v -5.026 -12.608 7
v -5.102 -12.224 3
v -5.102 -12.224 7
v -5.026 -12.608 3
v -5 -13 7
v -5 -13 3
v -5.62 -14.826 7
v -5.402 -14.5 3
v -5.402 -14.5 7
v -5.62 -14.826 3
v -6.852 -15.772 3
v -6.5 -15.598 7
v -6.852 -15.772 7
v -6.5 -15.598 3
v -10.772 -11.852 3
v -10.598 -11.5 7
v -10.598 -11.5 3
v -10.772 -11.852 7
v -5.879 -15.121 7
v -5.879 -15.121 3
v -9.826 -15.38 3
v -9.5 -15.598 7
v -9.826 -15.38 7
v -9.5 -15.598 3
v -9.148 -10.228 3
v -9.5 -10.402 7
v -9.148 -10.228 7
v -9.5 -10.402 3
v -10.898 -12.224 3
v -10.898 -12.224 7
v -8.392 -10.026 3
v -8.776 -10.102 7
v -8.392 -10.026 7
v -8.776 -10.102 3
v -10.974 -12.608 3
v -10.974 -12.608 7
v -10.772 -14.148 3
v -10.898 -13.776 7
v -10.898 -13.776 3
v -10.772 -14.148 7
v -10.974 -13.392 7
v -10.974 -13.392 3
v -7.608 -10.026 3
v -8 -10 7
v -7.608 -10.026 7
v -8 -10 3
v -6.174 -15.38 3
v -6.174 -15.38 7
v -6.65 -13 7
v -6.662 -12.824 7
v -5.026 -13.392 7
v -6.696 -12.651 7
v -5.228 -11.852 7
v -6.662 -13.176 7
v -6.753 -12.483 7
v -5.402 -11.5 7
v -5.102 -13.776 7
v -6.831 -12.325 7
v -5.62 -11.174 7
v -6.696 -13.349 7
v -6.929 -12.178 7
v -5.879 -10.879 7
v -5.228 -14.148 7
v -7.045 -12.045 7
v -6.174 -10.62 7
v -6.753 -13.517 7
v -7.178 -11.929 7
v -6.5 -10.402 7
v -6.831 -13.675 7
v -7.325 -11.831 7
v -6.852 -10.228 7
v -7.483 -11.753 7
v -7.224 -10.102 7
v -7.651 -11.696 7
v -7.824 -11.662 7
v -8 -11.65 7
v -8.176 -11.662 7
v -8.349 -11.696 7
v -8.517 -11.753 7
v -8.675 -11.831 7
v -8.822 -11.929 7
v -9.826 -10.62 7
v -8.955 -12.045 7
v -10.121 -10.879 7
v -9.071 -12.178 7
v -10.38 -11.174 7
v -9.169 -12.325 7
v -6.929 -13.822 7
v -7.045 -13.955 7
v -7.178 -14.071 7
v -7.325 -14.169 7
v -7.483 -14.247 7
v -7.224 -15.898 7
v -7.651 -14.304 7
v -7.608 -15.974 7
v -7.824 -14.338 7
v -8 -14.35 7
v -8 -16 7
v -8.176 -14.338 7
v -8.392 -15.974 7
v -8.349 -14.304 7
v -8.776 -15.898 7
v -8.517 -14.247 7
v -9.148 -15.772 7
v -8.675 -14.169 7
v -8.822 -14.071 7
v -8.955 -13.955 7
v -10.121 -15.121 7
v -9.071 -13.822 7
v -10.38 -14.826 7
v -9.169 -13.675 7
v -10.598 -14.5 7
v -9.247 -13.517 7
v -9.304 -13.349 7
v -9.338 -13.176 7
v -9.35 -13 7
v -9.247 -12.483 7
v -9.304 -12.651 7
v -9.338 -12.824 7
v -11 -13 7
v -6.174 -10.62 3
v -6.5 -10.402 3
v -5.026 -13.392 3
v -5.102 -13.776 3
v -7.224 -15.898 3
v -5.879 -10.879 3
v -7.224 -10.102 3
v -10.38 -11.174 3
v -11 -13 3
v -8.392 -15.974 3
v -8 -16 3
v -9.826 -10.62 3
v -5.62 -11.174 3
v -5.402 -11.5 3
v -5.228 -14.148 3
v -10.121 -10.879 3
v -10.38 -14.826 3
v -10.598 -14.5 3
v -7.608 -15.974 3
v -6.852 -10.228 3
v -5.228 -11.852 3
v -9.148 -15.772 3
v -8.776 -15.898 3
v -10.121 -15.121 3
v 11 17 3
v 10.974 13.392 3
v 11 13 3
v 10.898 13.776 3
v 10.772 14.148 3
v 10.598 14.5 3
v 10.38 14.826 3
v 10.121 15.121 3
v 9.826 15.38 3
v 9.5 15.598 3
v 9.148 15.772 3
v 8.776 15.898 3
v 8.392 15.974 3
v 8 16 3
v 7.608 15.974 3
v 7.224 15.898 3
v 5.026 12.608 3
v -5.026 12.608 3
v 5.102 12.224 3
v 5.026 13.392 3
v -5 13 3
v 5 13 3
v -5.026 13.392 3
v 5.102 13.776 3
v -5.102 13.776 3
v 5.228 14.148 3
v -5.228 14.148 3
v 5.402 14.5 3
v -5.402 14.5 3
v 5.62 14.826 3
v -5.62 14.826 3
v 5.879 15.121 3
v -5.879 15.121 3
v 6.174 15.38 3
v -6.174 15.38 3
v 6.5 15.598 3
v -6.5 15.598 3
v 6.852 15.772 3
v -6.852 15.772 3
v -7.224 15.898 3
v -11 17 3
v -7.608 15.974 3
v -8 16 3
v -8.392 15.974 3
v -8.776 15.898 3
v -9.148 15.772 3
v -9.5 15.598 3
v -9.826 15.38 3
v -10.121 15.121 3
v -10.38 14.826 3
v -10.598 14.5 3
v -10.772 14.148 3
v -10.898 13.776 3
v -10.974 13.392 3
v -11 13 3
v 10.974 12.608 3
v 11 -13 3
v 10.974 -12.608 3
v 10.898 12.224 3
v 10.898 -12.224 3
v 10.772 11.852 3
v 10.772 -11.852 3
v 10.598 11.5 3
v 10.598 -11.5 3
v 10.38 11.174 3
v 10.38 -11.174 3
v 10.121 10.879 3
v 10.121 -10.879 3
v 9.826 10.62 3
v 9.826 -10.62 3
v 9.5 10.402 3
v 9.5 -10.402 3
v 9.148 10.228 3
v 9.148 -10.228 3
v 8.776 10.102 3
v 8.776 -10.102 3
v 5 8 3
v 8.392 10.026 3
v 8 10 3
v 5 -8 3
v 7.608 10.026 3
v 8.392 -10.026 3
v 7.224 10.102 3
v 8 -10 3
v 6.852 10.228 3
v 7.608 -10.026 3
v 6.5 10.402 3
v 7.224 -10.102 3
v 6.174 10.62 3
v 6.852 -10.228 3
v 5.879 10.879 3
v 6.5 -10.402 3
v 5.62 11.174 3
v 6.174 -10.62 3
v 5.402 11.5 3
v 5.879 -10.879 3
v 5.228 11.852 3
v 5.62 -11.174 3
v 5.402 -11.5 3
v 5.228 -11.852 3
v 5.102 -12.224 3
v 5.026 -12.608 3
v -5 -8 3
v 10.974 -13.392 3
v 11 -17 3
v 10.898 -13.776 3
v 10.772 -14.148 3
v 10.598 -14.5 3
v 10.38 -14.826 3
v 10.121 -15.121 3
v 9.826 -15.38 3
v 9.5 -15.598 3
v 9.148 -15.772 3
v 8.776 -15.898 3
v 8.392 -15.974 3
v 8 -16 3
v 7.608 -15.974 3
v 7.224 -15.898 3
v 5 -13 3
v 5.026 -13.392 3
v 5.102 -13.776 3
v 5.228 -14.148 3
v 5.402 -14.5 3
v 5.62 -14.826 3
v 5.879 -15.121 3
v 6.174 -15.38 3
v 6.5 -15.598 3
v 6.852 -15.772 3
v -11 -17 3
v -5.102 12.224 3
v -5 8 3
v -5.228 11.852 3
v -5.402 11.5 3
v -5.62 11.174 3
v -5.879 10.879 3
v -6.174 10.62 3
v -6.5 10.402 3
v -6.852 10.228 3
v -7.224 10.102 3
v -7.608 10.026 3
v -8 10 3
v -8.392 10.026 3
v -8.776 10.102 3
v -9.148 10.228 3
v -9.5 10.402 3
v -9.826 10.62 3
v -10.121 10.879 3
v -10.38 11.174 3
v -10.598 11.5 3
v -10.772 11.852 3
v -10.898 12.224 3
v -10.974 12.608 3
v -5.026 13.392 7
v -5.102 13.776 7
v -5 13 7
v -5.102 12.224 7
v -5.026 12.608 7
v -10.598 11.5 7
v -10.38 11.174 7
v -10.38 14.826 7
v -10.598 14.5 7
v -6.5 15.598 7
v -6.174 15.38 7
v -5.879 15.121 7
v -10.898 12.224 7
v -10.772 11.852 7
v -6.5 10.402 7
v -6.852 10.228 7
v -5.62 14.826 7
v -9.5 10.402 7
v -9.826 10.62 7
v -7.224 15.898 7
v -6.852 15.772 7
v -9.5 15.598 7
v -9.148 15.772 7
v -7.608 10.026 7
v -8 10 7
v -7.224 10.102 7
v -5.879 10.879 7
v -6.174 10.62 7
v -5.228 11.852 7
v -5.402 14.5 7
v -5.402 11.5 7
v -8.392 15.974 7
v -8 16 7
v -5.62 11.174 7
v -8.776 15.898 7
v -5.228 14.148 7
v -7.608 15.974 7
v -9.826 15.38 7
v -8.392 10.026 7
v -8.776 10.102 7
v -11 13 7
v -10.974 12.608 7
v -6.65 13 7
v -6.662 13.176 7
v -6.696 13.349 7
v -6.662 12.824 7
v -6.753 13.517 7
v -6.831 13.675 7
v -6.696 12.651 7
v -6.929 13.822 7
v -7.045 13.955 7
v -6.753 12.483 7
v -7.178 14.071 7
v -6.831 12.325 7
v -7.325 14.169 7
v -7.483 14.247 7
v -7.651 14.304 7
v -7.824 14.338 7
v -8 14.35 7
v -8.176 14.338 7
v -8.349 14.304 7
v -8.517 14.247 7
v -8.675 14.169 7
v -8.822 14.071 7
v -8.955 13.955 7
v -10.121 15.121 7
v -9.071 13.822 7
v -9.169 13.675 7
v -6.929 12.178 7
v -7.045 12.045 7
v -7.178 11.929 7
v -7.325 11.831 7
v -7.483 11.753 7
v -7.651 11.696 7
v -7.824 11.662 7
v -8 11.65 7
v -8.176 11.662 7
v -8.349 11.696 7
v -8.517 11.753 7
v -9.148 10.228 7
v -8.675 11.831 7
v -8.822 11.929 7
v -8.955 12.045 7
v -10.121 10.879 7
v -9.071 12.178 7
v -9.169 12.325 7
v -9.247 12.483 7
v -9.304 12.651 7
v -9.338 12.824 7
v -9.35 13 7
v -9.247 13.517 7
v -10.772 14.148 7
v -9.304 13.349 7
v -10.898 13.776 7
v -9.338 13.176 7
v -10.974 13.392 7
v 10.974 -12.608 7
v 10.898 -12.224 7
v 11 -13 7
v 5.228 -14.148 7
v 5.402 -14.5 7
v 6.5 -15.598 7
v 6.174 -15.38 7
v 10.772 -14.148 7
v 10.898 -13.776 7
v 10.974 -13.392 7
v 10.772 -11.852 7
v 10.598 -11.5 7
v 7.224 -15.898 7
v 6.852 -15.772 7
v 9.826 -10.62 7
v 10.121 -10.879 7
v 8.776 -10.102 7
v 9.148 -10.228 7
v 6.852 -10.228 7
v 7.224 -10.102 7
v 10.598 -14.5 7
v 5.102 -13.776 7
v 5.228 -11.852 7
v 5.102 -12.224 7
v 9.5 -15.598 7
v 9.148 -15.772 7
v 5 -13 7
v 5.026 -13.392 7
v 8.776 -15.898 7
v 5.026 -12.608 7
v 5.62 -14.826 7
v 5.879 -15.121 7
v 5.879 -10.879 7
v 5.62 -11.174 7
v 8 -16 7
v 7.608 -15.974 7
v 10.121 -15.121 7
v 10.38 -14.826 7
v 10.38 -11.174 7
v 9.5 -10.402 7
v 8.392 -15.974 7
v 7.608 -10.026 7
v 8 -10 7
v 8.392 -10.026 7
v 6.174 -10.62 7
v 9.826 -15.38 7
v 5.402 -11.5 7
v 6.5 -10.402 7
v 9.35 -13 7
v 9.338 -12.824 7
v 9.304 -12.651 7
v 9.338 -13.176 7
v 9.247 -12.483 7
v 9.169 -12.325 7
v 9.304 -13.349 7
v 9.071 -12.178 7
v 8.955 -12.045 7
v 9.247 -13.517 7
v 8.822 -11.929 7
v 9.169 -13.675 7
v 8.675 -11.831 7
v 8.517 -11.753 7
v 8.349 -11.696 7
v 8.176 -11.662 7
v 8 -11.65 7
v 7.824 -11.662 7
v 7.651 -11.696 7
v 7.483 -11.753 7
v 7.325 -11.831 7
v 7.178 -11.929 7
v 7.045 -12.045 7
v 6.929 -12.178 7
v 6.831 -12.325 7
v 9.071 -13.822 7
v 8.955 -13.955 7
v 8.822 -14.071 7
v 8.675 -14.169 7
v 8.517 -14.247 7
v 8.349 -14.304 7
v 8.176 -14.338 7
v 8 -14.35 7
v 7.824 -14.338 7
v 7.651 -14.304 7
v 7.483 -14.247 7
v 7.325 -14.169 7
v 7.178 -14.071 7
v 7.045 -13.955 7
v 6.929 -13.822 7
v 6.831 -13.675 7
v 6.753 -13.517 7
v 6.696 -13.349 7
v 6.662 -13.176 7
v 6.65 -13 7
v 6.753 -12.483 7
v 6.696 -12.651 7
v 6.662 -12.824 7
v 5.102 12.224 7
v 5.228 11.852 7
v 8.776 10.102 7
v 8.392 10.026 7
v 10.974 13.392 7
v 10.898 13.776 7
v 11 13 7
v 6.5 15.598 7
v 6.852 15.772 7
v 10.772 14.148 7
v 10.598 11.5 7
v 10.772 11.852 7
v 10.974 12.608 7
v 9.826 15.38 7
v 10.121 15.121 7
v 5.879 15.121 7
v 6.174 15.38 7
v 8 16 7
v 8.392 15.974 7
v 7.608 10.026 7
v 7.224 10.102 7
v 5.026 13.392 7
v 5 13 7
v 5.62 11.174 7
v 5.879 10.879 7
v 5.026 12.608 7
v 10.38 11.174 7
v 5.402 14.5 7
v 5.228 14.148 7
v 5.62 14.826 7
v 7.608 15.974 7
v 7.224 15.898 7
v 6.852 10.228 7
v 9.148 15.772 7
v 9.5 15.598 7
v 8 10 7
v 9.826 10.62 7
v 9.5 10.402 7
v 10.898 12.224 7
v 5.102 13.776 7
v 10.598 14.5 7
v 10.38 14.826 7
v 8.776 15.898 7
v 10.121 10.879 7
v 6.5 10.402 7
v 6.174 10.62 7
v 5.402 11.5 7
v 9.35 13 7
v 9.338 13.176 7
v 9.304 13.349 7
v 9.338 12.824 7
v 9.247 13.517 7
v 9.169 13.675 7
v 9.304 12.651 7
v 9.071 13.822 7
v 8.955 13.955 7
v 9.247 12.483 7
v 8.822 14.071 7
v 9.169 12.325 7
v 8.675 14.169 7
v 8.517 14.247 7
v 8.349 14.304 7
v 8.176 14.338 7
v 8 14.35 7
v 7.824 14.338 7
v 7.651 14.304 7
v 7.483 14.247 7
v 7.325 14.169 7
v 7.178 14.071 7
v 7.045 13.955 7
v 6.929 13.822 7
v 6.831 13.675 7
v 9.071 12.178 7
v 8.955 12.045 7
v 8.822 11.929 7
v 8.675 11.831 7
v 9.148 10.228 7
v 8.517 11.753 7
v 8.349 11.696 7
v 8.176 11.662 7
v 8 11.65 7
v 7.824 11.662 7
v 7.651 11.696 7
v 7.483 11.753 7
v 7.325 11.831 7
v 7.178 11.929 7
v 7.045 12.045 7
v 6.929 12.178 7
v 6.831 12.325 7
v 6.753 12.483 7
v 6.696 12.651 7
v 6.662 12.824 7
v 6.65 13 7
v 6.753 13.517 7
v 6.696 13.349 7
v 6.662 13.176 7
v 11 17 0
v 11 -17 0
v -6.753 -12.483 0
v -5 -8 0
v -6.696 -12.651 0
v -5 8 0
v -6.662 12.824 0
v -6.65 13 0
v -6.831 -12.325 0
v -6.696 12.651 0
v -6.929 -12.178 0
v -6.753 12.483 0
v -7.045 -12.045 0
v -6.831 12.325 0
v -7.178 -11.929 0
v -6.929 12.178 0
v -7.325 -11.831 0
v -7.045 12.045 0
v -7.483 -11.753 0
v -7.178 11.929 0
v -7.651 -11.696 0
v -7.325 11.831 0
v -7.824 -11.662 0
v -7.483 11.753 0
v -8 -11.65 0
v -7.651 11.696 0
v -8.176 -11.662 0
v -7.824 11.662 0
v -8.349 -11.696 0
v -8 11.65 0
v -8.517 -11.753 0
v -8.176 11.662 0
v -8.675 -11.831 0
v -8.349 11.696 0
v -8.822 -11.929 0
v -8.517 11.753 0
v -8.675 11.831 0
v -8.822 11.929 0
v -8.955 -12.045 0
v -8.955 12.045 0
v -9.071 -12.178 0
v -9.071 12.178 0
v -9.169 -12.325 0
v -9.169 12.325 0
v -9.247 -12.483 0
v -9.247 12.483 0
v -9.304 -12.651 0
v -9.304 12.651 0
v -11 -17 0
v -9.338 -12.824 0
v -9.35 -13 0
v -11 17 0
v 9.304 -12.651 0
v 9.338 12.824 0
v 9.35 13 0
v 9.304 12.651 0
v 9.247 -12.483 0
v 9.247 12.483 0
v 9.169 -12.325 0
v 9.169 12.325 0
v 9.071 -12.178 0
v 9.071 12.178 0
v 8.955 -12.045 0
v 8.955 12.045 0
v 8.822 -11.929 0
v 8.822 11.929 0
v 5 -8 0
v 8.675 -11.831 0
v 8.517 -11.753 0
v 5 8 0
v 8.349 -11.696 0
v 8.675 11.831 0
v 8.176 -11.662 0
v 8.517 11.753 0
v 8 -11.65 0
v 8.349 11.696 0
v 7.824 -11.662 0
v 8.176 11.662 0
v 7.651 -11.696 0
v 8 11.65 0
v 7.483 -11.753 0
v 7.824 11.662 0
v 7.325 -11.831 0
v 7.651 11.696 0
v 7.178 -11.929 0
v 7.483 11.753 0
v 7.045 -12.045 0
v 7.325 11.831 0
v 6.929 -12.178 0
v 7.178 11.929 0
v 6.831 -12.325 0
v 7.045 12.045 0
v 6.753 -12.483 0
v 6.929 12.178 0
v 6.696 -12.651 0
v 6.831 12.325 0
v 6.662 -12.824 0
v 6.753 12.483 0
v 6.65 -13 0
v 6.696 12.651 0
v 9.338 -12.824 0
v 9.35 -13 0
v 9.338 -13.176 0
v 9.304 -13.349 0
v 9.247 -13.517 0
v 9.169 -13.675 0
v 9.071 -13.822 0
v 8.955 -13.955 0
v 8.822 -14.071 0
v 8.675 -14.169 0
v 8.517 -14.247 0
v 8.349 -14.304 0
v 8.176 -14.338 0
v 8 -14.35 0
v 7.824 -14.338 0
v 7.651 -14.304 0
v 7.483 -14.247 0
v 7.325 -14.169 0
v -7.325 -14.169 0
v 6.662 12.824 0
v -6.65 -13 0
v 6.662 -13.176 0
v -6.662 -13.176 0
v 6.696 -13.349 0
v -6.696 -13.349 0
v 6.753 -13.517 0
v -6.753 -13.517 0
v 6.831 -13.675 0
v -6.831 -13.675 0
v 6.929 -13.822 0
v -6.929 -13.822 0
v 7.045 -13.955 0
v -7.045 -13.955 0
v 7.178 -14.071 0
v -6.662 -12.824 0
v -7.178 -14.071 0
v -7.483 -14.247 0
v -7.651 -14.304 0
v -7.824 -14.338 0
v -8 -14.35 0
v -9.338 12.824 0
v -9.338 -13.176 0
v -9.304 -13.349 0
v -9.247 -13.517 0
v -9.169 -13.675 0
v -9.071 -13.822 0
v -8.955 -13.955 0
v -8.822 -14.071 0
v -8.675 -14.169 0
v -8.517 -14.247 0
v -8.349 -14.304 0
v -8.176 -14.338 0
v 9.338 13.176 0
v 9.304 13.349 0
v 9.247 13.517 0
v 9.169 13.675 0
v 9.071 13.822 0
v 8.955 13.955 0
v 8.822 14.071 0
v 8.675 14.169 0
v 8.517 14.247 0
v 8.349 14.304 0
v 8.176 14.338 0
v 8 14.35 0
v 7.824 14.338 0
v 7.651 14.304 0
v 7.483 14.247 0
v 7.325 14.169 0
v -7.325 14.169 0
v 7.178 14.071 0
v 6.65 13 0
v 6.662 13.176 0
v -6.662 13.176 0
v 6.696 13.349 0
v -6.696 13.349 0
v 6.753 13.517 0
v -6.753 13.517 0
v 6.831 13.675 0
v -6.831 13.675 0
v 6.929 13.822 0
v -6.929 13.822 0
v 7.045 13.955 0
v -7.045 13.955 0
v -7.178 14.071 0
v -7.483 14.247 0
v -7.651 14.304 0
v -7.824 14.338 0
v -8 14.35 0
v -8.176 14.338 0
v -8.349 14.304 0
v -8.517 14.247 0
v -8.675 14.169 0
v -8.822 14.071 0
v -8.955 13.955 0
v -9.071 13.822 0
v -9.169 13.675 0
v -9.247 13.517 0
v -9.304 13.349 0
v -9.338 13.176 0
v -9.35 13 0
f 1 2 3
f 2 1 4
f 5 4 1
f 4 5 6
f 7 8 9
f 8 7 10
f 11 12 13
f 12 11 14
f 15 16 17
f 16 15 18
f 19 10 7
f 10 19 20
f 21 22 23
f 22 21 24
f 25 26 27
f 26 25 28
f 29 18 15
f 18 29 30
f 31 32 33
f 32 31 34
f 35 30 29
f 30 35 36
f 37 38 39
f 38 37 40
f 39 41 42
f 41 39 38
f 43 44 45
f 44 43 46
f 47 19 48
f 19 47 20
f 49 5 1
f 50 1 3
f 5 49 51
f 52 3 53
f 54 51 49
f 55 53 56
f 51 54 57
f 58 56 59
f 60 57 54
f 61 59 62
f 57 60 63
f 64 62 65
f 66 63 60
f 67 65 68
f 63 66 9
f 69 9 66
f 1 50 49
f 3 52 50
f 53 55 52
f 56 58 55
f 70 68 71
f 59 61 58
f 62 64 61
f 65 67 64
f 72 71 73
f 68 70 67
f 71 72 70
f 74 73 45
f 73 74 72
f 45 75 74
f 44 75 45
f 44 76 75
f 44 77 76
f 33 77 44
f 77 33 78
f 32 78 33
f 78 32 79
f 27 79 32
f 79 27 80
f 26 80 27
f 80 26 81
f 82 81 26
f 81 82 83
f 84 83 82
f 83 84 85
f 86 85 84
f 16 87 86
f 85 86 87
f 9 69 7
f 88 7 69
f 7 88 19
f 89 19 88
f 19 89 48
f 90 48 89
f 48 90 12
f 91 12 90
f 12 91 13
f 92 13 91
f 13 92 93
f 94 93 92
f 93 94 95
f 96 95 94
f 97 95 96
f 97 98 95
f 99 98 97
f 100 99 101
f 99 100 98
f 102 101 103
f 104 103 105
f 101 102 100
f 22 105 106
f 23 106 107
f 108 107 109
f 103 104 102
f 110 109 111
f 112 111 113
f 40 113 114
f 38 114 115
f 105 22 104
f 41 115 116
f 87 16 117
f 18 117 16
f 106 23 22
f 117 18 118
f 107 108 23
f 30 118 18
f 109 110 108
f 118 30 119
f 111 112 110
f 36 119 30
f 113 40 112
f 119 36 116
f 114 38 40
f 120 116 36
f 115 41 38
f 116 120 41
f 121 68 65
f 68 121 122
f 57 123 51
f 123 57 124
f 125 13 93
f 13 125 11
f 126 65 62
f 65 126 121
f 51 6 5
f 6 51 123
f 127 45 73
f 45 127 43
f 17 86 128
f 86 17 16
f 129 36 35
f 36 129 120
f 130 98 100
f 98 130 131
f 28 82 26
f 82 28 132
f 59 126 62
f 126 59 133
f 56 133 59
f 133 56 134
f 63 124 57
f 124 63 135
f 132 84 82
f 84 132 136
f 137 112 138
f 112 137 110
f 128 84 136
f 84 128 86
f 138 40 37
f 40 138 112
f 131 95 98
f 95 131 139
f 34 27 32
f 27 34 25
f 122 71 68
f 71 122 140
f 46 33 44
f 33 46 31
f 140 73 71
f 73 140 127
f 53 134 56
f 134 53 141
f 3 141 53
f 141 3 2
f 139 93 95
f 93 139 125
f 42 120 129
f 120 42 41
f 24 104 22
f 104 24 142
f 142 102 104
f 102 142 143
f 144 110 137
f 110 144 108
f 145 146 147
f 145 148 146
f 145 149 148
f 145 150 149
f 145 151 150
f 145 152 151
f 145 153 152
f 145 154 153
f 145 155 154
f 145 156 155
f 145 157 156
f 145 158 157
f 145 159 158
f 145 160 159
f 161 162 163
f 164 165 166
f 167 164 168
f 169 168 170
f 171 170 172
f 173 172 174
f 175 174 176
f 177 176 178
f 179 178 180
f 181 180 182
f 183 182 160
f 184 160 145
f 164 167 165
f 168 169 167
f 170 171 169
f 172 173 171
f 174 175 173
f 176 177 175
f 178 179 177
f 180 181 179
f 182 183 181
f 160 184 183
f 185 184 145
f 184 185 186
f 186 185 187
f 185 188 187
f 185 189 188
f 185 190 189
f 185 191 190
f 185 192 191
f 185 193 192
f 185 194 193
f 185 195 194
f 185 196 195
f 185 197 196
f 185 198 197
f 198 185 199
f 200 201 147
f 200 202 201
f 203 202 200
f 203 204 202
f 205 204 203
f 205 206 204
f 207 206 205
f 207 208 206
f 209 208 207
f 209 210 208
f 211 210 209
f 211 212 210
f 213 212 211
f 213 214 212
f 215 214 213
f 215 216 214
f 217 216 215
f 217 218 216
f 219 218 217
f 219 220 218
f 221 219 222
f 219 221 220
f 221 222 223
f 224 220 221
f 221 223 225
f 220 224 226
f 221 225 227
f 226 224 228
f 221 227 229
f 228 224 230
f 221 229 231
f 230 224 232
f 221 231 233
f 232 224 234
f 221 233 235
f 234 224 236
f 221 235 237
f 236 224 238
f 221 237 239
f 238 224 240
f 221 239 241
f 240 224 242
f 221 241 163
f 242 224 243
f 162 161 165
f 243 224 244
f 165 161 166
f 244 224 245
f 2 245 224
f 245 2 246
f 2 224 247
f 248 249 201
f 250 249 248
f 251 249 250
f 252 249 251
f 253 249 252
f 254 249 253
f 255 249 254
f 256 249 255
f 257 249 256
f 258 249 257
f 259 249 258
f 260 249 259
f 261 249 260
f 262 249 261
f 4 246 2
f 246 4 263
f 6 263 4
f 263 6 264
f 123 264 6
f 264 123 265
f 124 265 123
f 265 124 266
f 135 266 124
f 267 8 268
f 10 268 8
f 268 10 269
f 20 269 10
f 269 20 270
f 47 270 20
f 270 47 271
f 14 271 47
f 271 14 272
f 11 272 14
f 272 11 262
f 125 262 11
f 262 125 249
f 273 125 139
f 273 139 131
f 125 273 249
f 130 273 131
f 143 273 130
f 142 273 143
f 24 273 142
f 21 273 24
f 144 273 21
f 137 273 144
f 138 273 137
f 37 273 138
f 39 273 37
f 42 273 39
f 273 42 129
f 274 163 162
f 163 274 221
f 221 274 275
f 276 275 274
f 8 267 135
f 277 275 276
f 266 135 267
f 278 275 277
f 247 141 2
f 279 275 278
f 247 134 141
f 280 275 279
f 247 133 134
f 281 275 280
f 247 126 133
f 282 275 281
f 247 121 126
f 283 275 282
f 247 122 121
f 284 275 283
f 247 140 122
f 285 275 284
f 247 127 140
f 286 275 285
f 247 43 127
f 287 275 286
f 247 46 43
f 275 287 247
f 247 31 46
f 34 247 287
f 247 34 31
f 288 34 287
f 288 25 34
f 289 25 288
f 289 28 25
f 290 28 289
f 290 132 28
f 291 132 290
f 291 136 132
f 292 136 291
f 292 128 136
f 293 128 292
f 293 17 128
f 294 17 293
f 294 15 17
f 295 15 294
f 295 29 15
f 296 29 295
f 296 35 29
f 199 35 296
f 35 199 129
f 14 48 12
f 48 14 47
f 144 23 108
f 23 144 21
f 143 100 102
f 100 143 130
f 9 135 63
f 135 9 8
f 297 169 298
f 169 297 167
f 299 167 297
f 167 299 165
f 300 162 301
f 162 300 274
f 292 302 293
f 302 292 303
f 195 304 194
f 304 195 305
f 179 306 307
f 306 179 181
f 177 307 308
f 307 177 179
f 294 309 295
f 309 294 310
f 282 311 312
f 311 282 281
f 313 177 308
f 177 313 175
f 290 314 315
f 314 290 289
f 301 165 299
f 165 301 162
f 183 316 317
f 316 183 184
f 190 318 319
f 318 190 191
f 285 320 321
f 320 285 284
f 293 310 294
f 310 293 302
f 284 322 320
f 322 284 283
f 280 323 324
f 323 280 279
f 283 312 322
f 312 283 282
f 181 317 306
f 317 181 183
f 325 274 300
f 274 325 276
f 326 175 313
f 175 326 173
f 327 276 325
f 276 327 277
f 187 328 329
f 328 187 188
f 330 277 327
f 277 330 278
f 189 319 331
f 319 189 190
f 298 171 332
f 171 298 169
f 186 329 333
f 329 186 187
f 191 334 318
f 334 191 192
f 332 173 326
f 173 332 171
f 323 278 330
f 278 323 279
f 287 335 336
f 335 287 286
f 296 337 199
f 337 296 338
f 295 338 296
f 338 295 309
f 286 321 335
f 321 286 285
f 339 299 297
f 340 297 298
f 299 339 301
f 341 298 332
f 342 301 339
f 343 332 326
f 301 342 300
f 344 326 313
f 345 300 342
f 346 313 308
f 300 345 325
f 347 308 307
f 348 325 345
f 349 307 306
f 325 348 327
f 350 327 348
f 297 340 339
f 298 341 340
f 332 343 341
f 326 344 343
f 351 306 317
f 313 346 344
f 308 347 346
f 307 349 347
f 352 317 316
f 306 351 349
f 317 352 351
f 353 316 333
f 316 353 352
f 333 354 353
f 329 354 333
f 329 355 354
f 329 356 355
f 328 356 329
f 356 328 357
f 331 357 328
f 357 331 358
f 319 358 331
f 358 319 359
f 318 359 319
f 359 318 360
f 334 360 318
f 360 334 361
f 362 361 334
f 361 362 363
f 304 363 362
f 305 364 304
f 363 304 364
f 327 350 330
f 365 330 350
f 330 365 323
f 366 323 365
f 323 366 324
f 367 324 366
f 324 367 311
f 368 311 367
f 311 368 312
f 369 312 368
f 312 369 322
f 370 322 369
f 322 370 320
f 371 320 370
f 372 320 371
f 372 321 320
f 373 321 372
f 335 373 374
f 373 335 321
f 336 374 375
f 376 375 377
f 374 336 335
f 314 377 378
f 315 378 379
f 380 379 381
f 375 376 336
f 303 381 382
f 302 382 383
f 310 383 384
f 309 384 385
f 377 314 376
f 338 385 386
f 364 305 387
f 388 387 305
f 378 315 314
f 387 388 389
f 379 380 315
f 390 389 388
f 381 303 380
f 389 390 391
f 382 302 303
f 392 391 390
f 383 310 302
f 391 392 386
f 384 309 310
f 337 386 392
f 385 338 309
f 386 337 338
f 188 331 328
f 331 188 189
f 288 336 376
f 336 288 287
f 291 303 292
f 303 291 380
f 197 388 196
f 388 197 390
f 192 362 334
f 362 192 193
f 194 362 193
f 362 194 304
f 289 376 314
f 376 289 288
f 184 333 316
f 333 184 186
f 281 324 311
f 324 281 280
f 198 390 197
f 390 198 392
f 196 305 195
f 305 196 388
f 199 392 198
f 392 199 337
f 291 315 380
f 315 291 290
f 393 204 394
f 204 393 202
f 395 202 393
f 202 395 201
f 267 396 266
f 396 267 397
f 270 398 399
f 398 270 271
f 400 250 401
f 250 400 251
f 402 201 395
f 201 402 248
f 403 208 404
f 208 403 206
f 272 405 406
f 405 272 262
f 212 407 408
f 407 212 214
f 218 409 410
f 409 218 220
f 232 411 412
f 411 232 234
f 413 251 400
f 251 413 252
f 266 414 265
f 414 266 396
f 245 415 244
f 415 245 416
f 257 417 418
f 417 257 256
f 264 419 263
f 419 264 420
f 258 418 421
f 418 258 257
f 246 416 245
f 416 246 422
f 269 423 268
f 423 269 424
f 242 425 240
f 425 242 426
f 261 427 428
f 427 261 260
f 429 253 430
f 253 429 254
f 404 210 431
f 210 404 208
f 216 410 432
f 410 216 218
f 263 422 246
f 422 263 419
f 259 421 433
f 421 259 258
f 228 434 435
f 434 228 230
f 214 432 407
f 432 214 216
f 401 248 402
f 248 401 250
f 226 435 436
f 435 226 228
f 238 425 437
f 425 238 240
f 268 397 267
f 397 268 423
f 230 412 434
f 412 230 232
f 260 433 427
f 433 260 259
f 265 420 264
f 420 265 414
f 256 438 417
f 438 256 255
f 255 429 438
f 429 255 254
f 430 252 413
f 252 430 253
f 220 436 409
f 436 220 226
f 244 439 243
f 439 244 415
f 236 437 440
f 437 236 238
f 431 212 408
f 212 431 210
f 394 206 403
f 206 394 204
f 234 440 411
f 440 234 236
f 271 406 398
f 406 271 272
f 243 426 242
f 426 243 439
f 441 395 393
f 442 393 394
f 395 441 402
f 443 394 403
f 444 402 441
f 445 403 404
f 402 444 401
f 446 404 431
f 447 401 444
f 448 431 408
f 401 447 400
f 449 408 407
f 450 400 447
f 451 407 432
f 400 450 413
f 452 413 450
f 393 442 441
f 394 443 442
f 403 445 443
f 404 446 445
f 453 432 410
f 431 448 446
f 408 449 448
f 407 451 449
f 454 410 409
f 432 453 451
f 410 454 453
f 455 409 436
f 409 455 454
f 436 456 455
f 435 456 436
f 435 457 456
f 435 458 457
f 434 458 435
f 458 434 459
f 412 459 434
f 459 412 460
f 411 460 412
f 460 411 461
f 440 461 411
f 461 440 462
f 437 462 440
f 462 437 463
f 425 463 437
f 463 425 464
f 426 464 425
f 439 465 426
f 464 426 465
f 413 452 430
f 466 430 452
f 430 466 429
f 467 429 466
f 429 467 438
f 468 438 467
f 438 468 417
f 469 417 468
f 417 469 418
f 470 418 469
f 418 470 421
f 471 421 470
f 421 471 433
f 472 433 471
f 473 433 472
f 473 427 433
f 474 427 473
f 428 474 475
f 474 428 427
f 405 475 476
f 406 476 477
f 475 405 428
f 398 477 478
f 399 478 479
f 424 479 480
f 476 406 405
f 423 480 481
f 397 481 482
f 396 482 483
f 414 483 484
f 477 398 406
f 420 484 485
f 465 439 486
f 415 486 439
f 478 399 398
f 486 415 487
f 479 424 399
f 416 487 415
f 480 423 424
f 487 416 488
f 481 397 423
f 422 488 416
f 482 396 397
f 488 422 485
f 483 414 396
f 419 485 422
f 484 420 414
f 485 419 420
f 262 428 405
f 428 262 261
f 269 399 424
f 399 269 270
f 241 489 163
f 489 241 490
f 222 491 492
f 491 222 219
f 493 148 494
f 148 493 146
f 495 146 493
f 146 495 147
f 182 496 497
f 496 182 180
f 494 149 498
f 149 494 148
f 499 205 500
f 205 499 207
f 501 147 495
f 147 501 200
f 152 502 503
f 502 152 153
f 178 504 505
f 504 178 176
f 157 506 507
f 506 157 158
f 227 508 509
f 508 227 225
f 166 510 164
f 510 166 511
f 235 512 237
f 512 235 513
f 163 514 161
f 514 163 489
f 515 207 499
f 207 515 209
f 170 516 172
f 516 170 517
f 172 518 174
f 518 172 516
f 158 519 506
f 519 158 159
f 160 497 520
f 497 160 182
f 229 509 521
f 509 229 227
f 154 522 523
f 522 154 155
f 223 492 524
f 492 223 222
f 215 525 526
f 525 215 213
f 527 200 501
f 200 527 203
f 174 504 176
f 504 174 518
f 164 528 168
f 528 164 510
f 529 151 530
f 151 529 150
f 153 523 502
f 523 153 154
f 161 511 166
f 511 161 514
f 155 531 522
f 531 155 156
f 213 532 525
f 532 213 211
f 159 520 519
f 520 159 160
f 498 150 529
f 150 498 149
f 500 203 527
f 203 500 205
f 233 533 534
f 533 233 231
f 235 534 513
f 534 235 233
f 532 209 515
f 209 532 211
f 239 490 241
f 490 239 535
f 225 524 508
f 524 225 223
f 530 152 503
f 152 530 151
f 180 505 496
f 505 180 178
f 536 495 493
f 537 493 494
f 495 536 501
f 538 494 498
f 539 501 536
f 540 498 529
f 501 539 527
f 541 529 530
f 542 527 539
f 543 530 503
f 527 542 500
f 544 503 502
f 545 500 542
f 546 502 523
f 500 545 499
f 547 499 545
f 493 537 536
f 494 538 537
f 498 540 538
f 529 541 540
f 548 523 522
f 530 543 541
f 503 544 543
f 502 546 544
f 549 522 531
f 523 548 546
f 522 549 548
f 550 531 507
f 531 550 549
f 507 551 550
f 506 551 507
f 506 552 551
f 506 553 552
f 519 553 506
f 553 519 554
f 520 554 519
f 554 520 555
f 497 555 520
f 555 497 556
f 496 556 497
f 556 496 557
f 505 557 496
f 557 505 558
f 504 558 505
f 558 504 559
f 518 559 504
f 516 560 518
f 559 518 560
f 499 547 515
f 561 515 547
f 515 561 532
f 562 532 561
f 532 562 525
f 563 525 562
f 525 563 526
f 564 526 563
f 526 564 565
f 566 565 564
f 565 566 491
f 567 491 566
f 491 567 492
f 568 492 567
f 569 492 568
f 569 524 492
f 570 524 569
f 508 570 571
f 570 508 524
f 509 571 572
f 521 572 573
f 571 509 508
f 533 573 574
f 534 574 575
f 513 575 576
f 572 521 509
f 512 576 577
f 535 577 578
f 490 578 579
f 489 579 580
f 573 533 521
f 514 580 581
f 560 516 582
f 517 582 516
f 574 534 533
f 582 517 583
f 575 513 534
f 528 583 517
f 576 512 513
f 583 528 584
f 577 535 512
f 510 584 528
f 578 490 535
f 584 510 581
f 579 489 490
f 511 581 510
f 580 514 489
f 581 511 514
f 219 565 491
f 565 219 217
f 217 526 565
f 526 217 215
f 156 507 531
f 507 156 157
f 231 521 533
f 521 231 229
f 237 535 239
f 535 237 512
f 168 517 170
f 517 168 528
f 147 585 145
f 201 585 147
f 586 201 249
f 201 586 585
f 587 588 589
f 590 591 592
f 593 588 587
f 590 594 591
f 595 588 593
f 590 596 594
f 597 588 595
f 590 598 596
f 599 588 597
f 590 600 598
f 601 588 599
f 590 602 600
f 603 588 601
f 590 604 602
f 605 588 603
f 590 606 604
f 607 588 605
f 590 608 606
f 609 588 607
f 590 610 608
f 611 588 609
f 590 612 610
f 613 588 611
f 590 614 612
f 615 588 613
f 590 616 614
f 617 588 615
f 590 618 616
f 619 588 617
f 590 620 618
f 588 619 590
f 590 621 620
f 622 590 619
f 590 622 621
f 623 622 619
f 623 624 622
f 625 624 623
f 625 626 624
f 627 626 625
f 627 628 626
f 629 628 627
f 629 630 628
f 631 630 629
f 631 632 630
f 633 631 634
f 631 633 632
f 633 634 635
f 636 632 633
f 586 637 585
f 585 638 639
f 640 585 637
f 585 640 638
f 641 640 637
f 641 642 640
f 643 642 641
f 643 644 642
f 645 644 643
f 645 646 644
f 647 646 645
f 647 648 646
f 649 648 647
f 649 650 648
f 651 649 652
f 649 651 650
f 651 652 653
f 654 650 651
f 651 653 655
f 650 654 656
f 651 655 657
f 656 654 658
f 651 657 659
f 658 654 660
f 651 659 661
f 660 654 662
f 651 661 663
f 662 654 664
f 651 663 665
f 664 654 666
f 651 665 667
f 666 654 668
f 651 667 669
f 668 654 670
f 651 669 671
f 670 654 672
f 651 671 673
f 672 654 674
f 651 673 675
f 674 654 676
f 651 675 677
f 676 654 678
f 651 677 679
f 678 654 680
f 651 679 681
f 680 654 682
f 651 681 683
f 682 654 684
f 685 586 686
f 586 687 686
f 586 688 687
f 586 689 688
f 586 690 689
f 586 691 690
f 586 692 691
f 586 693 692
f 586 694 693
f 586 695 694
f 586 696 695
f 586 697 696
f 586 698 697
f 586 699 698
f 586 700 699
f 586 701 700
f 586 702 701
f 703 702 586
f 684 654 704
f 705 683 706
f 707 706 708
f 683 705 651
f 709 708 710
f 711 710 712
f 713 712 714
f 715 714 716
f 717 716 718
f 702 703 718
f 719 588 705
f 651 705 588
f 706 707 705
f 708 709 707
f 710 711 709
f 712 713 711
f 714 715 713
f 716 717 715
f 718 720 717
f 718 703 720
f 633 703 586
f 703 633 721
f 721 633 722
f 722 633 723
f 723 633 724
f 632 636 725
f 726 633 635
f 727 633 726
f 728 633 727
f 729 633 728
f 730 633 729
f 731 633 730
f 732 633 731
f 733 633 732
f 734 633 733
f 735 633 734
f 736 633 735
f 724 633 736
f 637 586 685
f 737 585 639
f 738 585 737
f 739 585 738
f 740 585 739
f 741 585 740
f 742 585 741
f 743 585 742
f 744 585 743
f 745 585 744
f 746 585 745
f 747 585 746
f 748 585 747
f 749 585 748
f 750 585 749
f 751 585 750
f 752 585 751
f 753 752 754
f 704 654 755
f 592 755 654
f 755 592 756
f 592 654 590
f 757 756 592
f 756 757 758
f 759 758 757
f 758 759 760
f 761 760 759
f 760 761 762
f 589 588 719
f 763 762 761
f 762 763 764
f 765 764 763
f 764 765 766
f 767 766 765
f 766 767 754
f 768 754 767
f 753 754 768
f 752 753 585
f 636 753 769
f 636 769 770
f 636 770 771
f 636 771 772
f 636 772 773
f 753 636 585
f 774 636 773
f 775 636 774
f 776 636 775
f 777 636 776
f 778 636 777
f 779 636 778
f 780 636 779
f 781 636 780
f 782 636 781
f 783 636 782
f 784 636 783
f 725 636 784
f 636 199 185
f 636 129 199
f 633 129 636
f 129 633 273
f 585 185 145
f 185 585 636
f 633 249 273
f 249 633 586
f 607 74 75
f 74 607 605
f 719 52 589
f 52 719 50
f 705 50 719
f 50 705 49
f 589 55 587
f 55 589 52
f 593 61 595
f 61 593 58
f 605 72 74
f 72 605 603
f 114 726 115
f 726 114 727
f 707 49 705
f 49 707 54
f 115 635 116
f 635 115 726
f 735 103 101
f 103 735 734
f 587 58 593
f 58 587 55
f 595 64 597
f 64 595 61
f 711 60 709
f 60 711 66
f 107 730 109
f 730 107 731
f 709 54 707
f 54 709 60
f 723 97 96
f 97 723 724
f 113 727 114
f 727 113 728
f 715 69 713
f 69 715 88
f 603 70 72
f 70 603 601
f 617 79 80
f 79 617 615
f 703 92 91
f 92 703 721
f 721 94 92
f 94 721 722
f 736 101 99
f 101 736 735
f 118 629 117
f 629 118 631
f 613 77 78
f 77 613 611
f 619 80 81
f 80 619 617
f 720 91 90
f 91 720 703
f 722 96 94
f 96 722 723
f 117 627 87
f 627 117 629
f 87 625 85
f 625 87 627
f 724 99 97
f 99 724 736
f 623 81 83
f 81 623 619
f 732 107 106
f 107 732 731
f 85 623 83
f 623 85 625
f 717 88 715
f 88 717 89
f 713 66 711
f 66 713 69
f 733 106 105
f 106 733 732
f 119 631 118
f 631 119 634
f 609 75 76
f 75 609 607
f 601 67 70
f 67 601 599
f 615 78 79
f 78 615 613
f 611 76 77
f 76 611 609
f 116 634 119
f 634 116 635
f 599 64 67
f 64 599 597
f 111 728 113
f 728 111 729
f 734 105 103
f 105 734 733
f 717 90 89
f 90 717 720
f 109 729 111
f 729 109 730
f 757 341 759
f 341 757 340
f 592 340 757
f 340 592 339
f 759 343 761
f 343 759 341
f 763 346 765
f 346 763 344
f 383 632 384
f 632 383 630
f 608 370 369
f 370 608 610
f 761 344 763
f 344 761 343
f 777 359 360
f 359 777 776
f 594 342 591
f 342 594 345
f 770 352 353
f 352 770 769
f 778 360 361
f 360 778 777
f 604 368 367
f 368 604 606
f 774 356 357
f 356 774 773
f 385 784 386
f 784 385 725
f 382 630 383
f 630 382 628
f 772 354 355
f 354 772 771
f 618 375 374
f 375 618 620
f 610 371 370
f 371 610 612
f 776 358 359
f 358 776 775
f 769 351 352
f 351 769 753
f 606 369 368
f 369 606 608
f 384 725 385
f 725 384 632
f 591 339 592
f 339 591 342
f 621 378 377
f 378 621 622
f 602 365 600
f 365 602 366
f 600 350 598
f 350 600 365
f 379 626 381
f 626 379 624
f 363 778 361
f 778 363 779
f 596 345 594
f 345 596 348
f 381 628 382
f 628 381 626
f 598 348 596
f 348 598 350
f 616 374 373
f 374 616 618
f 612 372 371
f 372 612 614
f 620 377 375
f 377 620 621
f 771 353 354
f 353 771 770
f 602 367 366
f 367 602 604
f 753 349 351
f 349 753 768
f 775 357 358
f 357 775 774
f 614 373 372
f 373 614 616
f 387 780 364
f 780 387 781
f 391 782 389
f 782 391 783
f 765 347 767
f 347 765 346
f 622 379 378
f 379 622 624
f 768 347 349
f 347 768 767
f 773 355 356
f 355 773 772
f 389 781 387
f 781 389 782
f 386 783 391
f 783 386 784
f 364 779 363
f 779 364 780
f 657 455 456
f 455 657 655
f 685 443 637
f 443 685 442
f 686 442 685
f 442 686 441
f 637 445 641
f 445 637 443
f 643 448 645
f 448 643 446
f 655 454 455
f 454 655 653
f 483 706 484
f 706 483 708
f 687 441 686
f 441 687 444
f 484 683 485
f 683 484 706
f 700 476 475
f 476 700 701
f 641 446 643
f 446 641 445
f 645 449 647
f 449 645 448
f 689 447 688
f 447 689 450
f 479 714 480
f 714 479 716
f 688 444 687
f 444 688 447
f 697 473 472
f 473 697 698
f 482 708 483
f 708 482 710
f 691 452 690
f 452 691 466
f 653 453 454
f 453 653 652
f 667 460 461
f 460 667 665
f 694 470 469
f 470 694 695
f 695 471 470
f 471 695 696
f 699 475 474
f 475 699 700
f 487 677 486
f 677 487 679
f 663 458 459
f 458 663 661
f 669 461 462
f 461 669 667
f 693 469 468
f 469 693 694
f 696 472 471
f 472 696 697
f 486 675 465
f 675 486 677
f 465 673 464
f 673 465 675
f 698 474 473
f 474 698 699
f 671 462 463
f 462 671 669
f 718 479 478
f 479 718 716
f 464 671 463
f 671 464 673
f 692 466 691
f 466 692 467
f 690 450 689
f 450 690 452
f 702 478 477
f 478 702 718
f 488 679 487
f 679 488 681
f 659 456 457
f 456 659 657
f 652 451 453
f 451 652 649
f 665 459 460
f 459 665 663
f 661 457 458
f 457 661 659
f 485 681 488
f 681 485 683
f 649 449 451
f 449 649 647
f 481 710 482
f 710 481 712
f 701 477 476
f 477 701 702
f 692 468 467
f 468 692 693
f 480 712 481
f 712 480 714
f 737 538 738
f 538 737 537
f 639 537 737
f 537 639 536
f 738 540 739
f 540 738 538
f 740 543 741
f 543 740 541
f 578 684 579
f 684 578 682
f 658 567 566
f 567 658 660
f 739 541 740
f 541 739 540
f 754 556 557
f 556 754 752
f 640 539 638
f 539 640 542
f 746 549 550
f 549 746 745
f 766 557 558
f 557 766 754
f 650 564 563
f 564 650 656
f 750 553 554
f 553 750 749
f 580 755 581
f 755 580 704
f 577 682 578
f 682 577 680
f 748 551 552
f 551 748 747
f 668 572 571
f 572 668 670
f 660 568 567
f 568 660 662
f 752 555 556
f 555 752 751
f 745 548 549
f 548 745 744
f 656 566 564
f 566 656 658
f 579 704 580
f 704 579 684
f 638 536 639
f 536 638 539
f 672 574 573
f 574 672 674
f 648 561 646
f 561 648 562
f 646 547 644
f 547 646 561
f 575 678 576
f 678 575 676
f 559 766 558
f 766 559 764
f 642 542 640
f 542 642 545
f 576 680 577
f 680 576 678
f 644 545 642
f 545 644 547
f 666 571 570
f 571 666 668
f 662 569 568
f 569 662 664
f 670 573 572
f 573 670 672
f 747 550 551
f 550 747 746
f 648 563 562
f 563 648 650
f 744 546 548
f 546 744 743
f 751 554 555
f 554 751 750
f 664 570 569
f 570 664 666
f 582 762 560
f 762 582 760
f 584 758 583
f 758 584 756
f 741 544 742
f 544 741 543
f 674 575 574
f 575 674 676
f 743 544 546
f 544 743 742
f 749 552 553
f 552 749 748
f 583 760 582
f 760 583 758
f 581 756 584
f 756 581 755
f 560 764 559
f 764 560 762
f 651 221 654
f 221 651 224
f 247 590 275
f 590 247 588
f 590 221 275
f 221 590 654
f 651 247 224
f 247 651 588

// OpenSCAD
// HIL-02 passive sensor carrier concept, millimetres, no actuator.
// Separate draft parts, hardware envelopes are assumptions until measured.
part="tray"; // [tray,lever_sensor,coupon,shaft_insert]
$fn=48;
module tray(){
 difference(){
  union(){
   translate([-11,-17,0]) cube([22,34,3]);
   for(x=[-8,8],y=[-13,13])translate([x,y,3])cylinder(d=6,h=4);
  }
  for(x=[-8,8],y=[-13,13])translate([x,y,-1])cylinder(d=2.7,h=10);
  translate([-5,-8,-1])cube([10,16,5]);
 }
}
module lever_sensor(){
 difference(){
  union(){
   translate([-10,-12,0])cube([20,24,3]);
   translate([-10,-12,3])cube([4,24,13]);
   translate([6,-12,3])cube([4,24,13]);
  }
  for(x=[-8,8])translate([x,0,11])rotate([0,90,0])cylinder(d=4.2,h=6,center=true);
  for(y=[-8,8])translate([0,y,-1])cylinder(d=3.4,h=5);
 }
}
module shaft_insert(){
 difference(){
  union(){cylinder(d=7.8,h=12);cylinder(d=12,h=2);}
  translate([0,0,-1])cylinder(d=4.4,h=15);
 }
}
module coupon(){
 difference(){cube([48,20,5]);for(i=[0:3])translate([7+i*11,10,-1])cylinder(d=[2.7,3.4,4.2,4.4][i],h=7);}
}
if(part=="tray")tray();else if(part=="lever_sensor")lever_sensor();else if(part=="shaft_insert")shaft_insert();else if(part=="coupon")coupon();
